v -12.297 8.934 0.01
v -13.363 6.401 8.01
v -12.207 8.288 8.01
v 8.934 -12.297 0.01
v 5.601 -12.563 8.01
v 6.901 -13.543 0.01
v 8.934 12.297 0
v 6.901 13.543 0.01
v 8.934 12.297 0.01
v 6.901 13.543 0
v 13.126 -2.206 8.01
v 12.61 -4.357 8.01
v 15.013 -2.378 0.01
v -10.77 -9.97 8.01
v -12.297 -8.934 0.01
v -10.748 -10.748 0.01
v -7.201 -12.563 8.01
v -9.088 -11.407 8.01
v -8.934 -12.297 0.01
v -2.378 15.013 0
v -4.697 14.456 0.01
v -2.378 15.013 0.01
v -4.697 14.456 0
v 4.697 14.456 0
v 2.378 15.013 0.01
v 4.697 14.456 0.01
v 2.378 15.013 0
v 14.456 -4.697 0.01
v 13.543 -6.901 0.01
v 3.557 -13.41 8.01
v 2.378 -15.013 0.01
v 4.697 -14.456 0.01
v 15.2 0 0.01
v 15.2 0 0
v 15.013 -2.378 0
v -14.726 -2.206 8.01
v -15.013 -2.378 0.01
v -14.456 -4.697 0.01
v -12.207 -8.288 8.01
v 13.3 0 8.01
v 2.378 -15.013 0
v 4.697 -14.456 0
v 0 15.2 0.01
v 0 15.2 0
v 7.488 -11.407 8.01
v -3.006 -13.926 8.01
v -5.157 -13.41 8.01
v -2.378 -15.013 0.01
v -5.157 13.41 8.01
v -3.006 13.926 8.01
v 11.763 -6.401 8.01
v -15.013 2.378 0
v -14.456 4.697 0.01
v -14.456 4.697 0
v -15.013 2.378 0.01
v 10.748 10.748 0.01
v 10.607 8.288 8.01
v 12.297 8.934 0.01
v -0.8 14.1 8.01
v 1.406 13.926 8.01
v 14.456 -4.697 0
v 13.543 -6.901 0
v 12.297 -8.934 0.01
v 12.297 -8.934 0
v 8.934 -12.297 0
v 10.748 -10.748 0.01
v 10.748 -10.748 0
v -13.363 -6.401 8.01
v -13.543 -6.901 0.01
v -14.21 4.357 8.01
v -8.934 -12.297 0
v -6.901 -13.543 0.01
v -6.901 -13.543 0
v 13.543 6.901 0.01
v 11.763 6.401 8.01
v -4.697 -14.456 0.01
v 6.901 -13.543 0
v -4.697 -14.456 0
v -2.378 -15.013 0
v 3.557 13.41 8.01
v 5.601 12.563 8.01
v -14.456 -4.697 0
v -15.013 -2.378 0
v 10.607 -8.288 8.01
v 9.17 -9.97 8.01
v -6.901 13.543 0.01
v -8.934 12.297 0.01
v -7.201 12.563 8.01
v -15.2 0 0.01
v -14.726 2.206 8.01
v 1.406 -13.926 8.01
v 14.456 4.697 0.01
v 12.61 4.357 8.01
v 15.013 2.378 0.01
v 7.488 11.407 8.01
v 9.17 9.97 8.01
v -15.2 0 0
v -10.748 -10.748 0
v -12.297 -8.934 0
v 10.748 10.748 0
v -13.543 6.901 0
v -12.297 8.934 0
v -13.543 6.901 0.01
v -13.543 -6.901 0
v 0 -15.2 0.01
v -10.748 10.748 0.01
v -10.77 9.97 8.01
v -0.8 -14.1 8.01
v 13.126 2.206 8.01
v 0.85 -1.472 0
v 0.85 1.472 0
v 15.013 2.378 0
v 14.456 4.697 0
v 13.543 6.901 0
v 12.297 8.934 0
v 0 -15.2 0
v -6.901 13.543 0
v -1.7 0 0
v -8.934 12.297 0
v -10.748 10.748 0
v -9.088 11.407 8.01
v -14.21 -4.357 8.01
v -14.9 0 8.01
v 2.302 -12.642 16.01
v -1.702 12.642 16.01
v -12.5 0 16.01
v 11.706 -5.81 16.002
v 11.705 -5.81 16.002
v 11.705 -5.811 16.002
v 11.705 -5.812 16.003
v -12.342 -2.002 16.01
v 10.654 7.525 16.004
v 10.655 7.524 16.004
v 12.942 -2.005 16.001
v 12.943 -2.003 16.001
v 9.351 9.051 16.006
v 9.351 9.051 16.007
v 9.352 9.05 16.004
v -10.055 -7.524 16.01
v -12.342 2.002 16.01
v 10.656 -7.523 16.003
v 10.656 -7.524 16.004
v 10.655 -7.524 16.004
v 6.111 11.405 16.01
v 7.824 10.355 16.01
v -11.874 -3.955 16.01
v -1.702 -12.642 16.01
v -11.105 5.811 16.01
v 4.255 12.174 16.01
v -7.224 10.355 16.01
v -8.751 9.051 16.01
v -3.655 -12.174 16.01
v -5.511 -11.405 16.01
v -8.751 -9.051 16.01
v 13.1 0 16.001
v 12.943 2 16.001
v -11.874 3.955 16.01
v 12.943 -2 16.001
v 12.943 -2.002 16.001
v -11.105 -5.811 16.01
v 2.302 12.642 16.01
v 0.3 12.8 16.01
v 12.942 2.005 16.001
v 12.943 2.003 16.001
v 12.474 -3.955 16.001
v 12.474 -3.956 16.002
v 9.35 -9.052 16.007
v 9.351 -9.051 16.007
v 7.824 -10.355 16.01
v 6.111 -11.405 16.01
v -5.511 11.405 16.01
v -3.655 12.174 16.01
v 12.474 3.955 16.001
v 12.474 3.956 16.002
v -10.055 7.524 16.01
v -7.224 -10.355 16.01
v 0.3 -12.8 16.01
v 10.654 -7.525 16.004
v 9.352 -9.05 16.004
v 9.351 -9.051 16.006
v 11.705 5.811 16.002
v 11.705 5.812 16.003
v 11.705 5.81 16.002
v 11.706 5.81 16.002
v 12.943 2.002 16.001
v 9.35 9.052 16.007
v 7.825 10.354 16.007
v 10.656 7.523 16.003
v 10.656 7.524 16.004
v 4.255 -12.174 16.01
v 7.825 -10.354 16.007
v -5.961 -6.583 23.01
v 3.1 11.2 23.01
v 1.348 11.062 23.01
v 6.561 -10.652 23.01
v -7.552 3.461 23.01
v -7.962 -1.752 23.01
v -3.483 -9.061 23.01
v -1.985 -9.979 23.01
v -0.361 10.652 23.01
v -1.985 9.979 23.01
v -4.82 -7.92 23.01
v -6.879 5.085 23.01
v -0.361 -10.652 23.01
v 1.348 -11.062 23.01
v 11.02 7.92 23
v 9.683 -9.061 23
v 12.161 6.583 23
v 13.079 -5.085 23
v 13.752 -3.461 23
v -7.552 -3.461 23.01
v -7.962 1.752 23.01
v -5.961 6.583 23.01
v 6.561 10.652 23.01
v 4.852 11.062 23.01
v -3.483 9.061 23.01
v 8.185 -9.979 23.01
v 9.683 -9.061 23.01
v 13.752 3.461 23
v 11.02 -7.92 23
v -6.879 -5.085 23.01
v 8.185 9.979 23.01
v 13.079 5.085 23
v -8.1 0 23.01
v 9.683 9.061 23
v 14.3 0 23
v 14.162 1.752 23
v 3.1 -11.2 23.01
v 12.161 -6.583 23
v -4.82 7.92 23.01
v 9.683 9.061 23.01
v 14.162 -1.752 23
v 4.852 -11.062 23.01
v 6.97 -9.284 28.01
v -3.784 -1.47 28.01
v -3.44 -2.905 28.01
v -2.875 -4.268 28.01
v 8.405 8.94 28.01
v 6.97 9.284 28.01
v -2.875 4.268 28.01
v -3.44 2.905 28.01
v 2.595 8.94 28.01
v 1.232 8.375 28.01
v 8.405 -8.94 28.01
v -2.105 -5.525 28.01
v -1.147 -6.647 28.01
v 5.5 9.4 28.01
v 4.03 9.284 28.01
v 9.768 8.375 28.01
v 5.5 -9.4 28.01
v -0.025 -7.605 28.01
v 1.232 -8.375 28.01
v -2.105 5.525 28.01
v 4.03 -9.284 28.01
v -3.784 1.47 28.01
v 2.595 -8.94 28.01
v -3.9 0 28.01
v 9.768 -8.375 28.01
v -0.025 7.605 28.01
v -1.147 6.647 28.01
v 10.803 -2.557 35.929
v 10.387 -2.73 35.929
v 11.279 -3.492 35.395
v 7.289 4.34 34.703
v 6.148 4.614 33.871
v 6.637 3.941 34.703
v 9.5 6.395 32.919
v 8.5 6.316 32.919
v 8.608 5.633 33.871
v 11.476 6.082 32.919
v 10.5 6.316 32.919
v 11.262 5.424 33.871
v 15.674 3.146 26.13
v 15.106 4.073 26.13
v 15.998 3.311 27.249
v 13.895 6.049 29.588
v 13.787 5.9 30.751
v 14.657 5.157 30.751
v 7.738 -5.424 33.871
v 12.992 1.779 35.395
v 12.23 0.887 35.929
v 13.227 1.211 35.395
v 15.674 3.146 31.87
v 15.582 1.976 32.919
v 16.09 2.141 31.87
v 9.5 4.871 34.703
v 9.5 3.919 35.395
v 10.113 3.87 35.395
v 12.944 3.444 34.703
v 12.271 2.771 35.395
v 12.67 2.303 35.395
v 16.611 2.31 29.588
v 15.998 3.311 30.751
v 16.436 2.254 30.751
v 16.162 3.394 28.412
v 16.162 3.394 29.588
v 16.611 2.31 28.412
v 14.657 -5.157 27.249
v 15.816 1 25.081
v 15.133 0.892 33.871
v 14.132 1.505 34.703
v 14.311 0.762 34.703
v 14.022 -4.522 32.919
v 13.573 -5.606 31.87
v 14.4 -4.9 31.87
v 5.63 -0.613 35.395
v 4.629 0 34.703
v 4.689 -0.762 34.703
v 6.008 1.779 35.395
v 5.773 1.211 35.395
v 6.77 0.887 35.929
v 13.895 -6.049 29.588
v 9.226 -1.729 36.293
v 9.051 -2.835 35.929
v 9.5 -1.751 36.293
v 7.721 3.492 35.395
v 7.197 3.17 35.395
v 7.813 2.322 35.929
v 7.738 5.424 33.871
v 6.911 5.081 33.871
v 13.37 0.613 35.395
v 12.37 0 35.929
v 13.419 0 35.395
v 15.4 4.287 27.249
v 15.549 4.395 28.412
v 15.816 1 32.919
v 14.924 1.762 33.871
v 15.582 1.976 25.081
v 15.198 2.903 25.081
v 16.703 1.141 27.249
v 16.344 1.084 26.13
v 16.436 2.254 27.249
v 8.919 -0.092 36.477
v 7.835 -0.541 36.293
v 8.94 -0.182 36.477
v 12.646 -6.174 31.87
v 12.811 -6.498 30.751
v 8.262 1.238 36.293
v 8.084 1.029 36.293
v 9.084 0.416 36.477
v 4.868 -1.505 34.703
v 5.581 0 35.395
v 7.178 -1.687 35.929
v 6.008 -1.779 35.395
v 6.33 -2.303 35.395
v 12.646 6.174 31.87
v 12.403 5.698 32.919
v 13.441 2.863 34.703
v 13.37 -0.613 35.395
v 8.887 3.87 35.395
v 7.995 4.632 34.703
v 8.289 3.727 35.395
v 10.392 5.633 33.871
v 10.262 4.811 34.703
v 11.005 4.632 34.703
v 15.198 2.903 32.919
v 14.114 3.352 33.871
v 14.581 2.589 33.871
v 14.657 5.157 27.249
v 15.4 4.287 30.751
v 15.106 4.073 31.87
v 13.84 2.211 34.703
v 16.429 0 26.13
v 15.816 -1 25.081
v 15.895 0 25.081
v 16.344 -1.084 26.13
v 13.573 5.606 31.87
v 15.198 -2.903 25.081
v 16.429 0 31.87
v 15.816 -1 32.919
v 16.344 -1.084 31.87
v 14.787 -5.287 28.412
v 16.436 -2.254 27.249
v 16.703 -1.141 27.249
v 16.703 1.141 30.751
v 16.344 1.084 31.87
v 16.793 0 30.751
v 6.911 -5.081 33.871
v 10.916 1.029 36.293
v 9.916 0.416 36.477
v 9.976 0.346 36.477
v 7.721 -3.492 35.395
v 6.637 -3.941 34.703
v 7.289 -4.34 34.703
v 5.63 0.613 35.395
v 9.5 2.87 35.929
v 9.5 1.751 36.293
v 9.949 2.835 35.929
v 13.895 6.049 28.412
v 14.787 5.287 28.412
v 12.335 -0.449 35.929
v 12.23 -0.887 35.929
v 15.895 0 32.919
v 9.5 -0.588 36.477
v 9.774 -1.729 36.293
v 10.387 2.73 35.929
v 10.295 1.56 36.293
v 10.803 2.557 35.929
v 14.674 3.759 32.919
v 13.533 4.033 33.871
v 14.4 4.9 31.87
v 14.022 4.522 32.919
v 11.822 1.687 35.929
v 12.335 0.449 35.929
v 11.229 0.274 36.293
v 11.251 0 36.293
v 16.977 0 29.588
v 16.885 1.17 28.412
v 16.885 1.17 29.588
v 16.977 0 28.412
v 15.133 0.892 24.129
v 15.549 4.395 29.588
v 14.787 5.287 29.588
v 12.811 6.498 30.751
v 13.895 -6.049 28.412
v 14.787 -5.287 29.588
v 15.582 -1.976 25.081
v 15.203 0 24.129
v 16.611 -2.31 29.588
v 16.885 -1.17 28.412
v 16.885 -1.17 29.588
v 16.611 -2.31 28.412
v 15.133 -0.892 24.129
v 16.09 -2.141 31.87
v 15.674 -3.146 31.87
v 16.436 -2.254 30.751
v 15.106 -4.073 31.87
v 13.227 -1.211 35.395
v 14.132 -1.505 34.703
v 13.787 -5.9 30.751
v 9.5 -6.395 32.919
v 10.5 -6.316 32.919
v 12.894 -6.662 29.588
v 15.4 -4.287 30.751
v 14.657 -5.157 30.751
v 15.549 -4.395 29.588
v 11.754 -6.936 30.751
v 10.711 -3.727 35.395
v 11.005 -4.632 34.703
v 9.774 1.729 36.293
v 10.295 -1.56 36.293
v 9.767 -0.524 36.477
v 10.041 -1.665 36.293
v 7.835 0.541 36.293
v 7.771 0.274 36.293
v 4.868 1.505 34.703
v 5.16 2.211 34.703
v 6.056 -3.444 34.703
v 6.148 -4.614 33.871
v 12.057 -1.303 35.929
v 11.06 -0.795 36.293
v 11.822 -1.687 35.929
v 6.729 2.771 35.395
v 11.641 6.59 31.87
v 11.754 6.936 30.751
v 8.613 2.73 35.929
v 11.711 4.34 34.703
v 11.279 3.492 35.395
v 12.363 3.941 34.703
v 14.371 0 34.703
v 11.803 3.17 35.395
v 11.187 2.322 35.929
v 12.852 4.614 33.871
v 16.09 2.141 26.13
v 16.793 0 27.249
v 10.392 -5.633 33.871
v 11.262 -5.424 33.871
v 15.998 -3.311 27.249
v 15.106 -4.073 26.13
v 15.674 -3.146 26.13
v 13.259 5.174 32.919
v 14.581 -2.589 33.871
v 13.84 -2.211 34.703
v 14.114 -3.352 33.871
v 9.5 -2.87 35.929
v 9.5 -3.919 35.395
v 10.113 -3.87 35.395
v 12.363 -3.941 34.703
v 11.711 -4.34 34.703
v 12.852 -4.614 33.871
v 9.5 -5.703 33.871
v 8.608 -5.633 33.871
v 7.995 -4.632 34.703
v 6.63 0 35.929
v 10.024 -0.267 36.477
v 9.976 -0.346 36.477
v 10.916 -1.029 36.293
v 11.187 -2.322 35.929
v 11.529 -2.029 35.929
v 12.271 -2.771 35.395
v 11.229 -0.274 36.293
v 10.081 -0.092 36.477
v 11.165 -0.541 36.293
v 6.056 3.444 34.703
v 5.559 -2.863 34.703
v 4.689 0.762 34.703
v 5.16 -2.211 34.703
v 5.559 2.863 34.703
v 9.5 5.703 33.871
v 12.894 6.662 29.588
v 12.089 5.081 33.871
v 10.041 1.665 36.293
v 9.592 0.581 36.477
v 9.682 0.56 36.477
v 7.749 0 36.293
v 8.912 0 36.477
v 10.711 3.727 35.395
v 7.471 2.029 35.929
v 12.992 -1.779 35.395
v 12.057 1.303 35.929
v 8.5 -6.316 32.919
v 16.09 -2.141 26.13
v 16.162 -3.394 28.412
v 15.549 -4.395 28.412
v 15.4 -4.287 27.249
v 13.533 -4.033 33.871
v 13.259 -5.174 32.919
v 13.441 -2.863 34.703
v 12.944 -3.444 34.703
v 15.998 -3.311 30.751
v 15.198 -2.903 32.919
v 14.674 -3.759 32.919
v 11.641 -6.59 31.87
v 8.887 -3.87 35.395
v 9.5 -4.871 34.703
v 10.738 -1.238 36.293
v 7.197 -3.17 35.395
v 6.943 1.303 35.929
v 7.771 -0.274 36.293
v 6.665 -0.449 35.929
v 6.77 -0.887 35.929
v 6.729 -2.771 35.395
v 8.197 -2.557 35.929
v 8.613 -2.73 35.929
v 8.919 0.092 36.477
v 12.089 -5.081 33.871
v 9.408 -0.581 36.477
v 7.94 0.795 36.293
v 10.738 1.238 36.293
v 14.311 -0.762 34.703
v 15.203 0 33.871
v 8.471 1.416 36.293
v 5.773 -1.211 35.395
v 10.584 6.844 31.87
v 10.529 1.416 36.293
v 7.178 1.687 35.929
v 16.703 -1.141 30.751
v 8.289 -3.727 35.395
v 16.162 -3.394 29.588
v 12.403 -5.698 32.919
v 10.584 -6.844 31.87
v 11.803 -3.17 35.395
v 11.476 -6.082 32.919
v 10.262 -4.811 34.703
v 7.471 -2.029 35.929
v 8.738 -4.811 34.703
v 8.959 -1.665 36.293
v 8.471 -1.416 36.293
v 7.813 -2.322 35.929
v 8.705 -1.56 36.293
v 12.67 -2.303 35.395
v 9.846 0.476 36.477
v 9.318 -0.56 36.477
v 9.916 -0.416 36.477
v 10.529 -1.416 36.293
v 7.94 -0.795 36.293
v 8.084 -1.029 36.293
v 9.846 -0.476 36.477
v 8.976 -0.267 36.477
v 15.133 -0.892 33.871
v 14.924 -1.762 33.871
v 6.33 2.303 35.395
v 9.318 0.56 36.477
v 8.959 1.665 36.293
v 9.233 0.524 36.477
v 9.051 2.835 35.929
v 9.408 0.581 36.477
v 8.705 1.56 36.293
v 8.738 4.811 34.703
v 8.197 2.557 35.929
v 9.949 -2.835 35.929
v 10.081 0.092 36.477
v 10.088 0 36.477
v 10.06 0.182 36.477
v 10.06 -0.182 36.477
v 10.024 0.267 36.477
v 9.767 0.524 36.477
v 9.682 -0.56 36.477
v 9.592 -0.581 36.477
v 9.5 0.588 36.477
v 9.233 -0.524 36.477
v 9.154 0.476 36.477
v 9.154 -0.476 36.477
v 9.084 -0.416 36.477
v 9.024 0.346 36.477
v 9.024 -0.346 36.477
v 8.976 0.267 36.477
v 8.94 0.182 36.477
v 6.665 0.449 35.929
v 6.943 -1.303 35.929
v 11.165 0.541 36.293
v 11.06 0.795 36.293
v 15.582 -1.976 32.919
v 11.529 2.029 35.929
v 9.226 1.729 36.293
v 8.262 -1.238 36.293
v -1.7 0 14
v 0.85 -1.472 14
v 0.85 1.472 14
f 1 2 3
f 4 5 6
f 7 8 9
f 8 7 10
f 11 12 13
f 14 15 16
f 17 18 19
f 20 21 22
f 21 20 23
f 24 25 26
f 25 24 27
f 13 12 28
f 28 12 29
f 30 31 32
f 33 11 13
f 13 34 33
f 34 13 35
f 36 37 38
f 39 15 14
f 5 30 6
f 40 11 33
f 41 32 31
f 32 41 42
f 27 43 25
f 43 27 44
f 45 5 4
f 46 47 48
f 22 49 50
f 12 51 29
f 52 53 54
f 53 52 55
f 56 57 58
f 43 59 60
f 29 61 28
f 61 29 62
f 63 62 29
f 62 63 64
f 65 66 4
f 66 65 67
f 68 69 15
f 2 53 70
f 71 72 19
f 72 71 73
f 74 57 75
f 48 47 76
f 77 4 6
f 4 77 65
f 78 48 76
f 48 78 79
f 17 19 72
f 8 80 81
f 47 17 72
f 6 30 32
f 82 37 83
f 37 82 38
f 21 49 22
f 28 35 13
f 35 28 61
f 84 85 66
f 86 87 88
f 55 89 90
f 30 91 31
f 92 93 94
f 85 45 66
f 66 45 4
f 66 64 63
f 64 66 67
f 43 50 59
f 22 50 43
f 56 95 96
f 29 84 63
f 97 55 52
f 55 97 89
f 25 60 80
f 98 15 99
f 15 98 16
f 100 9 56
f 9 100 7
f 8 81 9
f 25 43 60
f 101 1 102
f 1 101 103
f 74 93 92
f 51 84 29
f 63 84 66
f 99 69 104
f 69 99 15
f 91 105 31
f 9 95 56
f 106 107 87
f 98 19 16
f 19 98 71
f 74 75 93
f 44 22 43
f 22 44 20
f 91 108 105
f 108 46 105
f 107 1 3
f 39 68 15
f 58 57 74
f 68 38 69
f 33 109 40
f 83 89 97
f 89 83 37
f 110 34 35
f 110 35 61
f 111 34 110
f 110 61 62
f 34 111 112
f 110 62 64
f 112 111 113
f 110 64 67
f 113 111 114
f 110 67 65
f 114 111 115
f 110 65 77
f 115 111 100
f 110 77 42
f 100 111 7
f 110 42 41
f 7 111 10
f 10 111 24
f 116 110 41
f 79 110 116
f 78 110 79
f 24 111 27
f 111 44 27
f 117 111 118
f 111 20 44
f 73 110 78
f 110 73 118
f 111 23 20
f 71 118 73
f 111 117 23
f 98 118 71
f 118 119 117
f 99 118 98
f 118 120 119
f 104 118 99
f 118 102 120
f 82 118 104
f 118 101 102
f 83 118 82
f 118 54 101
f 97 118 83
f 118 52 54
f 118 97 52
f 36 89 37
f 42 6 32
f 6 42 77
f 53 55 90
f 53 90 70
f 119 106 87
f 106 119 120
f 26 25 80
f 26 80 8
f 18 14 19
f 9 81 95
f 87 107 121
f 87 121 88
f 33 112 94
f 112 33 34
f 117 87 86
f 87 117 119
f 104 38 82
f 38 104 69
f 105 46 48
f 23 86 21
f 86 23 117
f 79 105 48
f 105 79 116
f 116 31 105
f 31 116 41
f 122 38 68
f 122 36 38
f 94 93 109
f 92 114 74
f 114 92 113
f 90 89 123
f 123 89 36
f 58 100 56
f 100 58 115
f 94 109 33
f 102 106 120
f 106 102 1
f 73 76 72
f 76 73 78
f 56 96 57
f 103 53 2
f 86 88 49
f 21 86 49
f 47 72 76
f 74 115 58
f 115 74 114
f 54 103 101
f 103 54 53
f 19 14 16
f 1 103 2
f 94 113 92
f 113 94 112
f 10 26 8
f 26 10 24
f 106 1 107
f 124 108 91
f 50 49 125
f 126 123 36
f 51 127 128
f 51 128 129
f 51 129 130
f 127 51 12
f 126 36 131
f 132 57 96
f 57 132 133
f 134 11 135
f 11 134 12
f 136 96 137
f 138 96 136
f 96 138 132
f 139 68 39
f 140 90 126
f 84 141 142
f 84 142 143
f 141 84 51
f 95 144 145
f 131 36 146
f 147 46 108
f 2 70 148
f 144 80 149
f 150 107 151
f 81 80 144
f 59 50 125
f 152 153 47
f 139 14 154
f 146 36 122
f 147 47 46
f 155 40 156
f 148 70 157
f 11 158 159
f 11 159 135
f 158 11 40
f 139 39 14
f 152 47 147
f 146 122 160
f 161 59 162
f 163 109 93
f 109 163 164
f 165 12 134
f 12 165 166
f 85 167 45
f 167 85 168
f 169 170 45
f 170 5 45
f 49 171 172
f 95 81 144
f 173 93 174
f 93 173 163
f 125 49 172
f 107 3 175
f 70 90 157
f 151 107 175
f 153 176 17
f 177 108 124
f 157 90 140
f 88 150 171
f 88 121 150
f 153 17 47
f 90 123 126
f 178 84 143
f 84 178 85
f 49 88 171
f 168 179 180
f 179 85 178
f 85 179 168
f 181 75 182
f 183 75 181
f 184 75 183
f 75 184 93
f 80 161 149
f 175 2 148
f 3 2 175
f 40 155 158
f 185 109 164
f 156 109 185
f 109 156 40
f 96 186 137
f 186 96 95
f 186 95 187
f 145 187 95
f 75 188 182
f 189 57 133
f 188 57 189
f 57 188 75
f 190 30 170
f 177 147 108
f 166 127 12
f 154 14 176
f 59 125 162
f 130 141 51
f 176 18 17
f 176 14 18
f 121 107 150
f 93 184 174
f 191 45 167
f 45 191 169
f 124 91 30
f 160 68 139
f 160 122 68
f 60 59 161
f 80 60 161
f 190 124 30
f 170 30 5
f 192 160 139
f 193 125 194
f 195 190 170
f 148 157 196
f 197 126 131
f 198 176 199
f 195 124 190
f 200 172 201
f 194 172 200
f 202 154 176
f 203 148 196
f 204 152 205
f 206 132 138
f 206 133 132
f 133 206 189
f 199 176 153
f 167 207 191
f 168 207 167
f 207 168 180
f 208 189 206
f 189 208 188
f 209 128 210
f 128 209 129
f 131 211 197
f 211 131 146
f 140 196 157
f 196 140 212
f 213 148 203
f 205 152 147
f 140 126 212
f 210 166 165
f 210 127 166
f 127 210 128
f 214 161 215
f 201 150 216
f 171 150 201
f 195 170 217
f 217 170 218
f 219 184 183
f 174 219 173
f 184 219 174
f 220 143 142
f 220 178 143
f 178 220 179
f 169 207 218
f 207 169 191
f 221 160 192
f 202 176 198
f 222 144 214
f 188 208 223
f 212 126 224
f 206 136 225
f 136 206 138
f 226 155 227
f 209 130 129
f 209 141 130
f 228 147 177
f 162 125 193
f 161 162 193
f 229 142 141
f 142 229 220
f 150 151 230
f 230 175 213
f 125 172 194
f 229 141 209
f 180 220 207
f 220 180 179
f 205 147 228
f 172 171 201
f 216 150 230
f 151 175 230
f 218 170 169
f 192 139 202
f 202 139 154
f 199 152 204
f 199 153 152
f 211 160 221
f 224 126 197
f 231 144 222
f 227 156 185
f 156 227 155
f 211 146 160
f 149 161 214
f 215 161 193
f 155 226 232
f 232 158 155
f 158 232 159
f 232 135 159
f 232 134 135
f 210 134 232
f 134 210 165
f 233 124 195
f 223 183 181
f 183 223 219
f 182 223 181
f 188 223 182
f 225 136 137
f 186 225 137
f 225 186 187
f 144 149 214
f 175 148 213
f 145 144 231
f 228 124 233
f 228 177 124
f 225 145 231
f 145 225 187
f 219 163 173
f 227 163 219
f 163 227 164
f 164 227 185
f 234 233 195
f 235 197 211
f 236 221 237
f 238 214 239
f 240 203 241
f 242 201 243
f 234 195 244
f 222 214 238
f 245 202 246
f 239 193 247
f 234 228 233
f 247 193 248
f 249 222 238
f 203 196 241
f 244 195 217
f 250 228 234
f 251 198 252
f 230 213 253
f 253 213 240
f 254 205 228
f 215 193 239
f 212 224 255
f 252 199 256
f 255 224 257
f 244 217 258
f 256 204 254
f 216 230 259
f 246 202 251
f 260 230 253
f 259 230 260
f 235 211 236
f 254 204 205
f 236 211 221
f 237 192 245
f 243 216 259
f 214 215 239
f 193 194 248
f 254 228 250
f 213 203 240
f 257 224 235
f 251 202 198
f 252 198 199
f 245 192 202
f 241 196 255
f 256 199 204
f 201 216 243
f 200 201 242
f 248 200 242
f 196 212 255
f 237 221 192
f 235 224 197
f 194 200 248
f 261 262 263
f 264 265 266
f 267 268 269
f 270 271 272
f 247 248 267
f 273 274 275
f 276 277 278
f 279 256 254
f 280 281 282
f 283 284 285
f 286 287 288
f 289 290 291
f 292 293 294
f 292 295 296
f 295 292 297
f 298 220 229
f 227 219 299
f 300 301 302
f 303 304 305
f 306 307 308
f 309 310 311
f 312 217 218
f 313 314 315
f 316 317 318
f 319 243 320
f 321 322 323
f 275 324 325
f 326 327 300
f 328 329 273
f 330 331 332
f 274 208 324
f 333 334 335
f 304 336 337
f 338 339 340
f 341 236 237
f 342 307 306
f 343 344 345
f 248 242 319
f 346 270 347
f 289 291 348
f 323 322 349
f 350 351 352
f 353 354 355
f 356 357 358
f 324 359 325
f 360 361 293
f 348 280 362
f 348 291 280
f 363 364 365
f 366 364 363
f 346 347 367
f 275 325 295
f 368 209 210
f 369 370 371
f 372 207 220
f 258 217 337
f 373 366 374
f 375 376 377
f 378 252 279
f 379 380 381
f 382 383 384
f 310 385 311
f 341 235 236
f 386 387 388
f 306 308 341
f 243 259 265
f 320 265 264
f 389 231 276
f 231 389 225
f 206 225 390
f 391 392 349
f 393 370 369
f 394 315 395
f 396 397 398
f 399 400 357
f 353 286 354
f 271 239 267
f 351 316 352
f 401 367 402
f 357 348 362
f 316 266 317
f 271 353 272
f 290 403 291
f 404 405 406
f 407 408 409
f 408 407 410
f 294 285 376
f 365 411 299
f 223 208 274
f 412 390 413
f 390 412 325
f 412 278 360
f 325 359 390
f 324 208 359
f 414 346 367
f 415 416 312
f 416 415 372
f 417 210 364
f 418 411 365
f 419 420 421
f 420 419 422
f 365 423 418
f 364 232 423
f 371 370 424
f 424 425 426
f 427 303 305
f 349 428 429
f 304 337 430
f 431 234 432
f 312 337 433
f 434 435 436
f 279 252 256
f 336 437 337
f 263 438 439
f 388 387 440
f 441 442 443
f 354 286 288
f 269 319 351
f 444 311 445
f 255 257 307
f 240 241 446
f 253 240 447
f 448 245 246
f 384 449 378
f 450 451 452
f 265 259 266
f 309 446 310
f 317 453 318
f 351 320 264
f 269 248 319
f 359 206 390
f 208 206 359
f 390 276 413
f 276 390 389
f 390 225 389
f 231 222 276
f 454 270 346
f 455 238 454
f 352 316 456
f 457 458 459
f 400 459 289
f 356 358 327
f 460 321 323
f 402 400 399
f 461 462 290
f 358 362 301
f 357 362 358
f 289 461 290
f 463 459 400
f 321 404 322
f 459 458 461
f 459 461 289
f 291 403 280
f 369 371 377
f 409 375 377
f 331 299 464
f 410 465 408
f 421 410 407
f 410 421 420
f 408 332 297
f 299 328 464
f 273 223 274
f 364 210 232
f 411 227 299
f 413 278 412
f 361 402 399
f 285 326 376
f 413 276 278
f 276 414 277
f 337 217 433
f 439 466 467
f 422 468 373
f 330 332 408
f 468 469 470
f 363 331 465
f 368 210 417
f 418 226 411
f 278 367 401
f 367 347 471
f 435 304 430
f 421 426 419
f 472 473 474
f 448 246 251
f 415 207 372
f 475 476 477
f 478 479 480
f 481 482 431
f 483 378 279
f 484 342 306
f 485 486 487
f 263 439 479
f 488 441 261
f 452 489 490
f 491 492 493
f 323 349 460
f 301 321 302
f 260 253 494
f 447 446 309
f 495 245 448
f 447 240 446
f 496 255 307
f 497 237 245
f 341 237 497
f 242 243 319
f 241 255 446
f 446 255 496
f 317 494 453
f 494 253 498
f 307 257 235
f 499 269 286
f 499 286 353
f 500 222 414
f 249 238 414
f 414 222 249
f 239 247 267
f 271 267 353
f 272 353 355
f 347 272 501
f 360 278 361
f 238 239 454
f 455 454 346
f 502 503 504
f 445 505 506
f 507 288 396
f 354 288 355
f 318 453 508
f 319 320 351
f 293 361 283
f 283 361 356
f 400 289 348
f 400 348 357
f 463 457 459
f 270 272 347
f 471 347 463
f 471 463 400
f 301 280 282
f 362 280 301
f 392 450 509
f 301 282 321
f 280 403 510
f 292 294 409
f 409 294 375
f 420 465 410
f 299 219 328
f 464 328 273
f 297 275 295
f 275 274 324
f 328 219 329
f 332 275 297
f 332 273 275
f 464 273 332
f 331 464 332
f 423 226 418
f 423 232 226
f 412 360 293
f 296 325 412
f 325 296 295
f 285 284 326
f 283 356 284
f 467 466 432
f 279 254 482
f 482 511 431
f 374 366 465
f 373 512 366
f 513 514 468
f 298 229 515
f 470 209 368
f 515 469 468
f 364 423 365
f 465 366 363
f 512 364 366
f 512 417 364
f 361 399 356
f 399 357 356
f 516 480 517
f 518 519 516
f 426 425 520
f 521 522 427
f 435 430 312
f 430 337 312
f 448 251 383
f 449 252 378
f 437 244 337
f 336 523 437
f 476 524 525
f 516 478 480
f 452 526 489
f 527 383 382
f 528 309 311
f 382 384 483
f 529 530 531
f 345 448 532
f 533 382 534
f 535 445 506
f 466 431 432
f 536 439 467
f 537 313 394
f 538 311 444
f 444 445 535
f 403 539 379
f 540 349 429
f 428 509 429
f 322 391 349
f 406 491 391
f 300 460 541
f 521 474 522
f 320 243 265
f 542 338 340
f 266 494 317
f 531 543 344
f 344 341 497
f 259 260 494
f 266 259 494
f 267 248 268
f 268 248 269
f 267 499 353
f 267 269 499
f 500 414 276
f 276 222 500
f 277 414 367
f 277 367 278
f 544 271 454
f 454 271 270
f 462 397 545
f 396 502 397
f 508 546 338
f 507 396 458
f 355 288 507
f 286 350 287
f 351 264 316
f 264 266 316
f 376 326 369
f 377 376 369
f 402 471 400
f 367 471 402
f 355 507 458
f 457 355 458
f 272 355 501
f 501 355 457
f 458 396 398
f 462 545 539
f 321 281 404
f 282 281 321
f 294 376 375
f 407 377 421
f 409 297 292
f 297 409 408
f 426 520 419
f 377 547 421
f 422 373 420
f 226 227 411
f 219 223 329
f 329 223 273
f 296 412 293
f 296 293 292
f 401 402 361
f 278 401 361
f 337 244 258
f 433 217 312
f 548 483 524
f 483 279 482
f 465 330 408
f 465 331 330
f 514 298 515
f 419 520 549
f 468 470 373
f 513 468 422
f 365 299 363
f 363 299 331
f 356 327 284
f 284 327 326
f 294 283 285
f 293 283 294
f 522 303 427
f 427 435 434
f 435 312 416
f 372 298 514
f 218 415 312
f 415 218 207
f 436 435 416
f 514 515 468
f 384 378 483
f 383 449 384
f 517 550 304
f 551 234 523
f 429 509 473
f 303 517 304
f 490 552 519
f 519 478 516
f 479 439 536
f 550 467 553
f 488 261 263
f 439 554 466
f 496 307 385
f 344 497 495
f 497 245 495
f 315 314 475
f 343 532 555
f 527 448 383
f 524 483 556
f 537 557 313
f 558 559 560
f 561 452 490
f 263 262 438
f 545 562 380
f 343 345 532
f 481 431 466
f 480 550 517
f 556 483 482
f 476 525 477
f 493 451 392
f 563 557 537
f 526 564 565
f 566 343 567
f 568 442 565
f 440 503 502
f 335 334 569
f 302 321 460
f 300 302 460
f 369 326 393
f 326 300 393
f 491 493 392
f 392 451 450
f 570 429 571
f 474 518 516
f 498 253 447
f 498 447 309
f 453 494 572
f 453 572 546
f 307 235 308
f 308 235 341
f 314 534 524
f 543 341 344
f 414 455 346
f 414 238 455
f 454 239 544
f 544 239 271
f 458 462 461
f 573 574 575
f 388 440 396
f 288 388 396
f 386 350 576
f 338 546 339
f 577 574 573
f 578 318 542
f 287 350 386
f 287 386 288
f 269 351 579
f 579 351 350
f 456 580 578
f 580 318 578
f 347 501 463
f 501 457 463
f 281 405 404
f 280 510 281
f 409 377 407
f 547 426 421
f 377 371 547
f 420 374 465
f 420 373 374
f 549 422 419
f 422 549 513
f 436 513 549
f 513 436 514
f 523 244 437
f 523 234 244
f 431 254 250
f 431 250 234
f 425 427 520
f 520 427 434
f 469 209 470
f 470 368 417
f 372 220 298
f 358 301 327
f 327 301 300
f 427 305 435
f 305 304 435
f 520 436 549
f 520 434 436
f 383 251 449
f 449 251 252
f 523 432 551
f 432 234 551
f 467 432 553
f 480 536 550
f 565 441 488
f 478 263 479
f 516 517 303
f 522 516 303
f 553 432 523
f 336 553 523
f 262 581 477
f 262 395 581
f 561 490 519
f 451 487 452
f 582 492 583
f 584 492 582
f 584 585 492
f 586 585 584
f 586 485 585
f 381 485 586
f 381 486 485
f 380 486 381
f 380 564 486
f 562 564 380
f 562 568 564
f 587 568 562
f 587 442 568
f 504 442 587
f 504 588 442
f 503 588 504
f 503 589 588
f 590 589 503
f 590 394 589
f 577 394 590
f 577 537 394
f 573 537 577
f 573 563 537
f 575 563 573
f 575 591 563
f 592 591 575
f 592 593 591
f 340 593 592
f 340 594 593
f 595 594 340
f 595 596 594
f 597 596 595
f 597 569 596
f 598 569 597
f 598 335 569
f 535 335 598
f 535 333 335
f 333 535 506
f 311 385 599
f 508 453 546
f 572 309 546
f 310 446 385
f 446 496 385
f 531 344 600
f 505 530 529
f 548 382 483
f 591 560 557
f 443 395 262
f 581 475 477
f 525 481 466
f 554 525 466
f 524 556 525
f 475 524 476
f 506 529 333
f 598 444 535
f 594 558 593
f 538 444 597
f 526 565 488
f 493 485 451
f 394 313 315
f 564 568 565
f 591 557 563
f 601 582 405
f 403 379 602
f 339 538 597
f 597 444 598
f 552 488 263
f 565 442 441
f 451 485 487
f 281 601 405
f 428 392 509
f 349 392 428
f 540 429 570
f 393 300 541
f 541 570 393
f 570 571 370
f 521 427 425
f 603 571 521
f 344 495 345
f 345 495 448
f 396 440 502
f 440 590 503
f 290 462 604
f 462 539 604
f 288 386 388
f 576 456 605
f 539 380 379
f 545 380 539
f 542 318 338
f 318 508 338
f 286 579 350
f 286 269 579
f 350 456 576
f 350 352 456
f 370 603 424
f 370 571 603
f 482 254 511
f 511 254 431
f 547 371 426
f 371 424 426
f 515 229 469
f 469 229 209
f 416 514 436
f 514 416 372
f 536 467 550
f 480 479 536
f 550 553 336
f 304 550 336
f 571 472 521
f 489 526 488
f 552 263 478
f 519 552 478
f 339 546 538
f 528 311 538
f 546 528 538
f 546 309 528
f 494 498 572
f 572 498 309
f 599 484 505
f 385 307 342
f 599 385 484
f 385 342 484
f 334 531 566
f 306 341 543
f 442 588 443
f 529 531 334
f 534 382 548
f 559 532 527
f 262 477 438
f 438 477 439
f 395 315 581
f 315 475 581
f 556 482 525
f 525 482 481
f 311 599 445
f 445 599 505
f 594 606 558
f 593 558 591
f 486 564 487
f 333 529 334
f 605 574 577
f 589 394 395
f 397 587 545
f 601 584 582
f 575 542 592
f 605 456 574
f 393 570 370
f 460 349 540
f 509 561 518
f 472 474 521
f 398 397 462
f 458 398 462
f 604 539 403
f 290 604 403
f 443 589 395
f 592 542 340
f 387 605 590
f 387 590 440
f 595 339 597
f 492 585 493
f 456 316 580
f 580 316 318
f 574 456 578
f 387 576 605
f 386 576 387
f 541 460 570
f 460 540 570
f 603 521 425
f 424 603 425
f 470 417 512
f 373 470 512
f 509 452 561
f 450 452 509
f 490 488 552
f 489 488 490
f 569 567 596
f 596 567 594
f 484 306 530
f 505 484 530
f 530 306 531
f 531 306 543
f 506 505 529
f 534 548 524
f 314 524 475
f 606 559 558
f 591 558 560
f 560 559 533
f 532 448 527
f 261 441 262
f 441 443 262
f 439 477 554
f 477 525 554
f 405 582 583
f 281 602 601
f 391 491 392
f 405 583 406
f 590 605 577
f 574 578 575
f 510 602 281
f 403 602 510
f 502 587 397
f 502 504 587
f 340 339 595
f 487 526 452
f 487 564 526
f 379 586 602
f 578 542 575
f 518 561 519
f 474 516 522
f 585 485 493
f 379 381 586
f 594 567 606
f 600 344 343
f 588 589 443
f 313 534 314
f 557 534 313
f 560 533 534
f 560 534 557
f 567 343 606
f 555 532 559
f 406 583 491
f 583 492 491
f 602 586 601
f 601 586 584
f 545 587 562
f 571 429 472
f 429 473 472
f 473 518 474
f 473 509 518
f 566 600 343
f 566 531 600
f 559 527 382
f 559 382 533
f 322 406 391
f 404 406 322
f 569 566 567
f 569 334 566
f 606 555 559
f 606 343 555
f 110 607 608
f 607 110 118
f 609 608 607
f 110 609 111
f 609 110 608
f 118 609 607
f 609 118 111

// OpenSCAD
// file: horn_defs.scad
karkat = [
	[[0, 0, 0], 15.2],
	[[-0.8, 0, 8], 14.1],
	[[0.3, 0, 16], 12.8],
	[[3.1, 0, 23], 11.2],
	[[5.5, 0, 28], 9.4],
	[[9.5, 0, 29], 7.5]
];
// main file
include <MCAD/units.scad>;
include <MCAD/polyholes.scad>;

include <horn_defs.scad>;

troll = karkat;
hole_diameter = 1.7;
hole_depth = 14;
scale_factor = 1.00;
preview = false;

$fn = 40;

module sphere_from_array(array, element, scale_factor) {
	translate(array[element][0] * scale_factor)
	sphere(r = array[element][1] * scale_factor);
}

module disk_from_array(array, element, scale_factor) {
	translate(array[element][0] * scale_factor)
	cylinder(r = array[element][1] * scale_factor, h = epsilon * scale_factor);
}

module horn_from_array(array, hole_diameter, hole_depth, scale_factor) {
	difference() {
		union() {
			// Thin disks for most of the slices
			for(i = [0: len(array) - 3]) {
				hull() {
					disk_from_array(array, i, scale_factor);
					disk_from_array(array, i + 1, scale_factor);
				}
			}

			// A sphere for the top
			hull() {
				disk_from_array(array, len(array) - 3, scale_factor);
				disk_from_array(array, len(array) - 2, scale_factor);
				sphere_from_array(array, len(array) - 1, scale_factor);
			}
		}

		translate([0, 0, -epsilon])
		polyhole(d = hole_diameter, h = hole_depth + epsilon);
	}
}

if(preview) {
	translate([-30, 0, 0])
	rotate([0, -45, 0])
	horn_from_array(troll, hole_diameter, hole_depth, scale_factor);

	translate([30, 0, 0])
	rotate([0, -45, 180])
	horn_from_array(troll, hole_diameter, hole_depth, scale_factor);
} else {
	horn_from_array(troll, hole_diameter, hole_depth, scale_factor);
}
